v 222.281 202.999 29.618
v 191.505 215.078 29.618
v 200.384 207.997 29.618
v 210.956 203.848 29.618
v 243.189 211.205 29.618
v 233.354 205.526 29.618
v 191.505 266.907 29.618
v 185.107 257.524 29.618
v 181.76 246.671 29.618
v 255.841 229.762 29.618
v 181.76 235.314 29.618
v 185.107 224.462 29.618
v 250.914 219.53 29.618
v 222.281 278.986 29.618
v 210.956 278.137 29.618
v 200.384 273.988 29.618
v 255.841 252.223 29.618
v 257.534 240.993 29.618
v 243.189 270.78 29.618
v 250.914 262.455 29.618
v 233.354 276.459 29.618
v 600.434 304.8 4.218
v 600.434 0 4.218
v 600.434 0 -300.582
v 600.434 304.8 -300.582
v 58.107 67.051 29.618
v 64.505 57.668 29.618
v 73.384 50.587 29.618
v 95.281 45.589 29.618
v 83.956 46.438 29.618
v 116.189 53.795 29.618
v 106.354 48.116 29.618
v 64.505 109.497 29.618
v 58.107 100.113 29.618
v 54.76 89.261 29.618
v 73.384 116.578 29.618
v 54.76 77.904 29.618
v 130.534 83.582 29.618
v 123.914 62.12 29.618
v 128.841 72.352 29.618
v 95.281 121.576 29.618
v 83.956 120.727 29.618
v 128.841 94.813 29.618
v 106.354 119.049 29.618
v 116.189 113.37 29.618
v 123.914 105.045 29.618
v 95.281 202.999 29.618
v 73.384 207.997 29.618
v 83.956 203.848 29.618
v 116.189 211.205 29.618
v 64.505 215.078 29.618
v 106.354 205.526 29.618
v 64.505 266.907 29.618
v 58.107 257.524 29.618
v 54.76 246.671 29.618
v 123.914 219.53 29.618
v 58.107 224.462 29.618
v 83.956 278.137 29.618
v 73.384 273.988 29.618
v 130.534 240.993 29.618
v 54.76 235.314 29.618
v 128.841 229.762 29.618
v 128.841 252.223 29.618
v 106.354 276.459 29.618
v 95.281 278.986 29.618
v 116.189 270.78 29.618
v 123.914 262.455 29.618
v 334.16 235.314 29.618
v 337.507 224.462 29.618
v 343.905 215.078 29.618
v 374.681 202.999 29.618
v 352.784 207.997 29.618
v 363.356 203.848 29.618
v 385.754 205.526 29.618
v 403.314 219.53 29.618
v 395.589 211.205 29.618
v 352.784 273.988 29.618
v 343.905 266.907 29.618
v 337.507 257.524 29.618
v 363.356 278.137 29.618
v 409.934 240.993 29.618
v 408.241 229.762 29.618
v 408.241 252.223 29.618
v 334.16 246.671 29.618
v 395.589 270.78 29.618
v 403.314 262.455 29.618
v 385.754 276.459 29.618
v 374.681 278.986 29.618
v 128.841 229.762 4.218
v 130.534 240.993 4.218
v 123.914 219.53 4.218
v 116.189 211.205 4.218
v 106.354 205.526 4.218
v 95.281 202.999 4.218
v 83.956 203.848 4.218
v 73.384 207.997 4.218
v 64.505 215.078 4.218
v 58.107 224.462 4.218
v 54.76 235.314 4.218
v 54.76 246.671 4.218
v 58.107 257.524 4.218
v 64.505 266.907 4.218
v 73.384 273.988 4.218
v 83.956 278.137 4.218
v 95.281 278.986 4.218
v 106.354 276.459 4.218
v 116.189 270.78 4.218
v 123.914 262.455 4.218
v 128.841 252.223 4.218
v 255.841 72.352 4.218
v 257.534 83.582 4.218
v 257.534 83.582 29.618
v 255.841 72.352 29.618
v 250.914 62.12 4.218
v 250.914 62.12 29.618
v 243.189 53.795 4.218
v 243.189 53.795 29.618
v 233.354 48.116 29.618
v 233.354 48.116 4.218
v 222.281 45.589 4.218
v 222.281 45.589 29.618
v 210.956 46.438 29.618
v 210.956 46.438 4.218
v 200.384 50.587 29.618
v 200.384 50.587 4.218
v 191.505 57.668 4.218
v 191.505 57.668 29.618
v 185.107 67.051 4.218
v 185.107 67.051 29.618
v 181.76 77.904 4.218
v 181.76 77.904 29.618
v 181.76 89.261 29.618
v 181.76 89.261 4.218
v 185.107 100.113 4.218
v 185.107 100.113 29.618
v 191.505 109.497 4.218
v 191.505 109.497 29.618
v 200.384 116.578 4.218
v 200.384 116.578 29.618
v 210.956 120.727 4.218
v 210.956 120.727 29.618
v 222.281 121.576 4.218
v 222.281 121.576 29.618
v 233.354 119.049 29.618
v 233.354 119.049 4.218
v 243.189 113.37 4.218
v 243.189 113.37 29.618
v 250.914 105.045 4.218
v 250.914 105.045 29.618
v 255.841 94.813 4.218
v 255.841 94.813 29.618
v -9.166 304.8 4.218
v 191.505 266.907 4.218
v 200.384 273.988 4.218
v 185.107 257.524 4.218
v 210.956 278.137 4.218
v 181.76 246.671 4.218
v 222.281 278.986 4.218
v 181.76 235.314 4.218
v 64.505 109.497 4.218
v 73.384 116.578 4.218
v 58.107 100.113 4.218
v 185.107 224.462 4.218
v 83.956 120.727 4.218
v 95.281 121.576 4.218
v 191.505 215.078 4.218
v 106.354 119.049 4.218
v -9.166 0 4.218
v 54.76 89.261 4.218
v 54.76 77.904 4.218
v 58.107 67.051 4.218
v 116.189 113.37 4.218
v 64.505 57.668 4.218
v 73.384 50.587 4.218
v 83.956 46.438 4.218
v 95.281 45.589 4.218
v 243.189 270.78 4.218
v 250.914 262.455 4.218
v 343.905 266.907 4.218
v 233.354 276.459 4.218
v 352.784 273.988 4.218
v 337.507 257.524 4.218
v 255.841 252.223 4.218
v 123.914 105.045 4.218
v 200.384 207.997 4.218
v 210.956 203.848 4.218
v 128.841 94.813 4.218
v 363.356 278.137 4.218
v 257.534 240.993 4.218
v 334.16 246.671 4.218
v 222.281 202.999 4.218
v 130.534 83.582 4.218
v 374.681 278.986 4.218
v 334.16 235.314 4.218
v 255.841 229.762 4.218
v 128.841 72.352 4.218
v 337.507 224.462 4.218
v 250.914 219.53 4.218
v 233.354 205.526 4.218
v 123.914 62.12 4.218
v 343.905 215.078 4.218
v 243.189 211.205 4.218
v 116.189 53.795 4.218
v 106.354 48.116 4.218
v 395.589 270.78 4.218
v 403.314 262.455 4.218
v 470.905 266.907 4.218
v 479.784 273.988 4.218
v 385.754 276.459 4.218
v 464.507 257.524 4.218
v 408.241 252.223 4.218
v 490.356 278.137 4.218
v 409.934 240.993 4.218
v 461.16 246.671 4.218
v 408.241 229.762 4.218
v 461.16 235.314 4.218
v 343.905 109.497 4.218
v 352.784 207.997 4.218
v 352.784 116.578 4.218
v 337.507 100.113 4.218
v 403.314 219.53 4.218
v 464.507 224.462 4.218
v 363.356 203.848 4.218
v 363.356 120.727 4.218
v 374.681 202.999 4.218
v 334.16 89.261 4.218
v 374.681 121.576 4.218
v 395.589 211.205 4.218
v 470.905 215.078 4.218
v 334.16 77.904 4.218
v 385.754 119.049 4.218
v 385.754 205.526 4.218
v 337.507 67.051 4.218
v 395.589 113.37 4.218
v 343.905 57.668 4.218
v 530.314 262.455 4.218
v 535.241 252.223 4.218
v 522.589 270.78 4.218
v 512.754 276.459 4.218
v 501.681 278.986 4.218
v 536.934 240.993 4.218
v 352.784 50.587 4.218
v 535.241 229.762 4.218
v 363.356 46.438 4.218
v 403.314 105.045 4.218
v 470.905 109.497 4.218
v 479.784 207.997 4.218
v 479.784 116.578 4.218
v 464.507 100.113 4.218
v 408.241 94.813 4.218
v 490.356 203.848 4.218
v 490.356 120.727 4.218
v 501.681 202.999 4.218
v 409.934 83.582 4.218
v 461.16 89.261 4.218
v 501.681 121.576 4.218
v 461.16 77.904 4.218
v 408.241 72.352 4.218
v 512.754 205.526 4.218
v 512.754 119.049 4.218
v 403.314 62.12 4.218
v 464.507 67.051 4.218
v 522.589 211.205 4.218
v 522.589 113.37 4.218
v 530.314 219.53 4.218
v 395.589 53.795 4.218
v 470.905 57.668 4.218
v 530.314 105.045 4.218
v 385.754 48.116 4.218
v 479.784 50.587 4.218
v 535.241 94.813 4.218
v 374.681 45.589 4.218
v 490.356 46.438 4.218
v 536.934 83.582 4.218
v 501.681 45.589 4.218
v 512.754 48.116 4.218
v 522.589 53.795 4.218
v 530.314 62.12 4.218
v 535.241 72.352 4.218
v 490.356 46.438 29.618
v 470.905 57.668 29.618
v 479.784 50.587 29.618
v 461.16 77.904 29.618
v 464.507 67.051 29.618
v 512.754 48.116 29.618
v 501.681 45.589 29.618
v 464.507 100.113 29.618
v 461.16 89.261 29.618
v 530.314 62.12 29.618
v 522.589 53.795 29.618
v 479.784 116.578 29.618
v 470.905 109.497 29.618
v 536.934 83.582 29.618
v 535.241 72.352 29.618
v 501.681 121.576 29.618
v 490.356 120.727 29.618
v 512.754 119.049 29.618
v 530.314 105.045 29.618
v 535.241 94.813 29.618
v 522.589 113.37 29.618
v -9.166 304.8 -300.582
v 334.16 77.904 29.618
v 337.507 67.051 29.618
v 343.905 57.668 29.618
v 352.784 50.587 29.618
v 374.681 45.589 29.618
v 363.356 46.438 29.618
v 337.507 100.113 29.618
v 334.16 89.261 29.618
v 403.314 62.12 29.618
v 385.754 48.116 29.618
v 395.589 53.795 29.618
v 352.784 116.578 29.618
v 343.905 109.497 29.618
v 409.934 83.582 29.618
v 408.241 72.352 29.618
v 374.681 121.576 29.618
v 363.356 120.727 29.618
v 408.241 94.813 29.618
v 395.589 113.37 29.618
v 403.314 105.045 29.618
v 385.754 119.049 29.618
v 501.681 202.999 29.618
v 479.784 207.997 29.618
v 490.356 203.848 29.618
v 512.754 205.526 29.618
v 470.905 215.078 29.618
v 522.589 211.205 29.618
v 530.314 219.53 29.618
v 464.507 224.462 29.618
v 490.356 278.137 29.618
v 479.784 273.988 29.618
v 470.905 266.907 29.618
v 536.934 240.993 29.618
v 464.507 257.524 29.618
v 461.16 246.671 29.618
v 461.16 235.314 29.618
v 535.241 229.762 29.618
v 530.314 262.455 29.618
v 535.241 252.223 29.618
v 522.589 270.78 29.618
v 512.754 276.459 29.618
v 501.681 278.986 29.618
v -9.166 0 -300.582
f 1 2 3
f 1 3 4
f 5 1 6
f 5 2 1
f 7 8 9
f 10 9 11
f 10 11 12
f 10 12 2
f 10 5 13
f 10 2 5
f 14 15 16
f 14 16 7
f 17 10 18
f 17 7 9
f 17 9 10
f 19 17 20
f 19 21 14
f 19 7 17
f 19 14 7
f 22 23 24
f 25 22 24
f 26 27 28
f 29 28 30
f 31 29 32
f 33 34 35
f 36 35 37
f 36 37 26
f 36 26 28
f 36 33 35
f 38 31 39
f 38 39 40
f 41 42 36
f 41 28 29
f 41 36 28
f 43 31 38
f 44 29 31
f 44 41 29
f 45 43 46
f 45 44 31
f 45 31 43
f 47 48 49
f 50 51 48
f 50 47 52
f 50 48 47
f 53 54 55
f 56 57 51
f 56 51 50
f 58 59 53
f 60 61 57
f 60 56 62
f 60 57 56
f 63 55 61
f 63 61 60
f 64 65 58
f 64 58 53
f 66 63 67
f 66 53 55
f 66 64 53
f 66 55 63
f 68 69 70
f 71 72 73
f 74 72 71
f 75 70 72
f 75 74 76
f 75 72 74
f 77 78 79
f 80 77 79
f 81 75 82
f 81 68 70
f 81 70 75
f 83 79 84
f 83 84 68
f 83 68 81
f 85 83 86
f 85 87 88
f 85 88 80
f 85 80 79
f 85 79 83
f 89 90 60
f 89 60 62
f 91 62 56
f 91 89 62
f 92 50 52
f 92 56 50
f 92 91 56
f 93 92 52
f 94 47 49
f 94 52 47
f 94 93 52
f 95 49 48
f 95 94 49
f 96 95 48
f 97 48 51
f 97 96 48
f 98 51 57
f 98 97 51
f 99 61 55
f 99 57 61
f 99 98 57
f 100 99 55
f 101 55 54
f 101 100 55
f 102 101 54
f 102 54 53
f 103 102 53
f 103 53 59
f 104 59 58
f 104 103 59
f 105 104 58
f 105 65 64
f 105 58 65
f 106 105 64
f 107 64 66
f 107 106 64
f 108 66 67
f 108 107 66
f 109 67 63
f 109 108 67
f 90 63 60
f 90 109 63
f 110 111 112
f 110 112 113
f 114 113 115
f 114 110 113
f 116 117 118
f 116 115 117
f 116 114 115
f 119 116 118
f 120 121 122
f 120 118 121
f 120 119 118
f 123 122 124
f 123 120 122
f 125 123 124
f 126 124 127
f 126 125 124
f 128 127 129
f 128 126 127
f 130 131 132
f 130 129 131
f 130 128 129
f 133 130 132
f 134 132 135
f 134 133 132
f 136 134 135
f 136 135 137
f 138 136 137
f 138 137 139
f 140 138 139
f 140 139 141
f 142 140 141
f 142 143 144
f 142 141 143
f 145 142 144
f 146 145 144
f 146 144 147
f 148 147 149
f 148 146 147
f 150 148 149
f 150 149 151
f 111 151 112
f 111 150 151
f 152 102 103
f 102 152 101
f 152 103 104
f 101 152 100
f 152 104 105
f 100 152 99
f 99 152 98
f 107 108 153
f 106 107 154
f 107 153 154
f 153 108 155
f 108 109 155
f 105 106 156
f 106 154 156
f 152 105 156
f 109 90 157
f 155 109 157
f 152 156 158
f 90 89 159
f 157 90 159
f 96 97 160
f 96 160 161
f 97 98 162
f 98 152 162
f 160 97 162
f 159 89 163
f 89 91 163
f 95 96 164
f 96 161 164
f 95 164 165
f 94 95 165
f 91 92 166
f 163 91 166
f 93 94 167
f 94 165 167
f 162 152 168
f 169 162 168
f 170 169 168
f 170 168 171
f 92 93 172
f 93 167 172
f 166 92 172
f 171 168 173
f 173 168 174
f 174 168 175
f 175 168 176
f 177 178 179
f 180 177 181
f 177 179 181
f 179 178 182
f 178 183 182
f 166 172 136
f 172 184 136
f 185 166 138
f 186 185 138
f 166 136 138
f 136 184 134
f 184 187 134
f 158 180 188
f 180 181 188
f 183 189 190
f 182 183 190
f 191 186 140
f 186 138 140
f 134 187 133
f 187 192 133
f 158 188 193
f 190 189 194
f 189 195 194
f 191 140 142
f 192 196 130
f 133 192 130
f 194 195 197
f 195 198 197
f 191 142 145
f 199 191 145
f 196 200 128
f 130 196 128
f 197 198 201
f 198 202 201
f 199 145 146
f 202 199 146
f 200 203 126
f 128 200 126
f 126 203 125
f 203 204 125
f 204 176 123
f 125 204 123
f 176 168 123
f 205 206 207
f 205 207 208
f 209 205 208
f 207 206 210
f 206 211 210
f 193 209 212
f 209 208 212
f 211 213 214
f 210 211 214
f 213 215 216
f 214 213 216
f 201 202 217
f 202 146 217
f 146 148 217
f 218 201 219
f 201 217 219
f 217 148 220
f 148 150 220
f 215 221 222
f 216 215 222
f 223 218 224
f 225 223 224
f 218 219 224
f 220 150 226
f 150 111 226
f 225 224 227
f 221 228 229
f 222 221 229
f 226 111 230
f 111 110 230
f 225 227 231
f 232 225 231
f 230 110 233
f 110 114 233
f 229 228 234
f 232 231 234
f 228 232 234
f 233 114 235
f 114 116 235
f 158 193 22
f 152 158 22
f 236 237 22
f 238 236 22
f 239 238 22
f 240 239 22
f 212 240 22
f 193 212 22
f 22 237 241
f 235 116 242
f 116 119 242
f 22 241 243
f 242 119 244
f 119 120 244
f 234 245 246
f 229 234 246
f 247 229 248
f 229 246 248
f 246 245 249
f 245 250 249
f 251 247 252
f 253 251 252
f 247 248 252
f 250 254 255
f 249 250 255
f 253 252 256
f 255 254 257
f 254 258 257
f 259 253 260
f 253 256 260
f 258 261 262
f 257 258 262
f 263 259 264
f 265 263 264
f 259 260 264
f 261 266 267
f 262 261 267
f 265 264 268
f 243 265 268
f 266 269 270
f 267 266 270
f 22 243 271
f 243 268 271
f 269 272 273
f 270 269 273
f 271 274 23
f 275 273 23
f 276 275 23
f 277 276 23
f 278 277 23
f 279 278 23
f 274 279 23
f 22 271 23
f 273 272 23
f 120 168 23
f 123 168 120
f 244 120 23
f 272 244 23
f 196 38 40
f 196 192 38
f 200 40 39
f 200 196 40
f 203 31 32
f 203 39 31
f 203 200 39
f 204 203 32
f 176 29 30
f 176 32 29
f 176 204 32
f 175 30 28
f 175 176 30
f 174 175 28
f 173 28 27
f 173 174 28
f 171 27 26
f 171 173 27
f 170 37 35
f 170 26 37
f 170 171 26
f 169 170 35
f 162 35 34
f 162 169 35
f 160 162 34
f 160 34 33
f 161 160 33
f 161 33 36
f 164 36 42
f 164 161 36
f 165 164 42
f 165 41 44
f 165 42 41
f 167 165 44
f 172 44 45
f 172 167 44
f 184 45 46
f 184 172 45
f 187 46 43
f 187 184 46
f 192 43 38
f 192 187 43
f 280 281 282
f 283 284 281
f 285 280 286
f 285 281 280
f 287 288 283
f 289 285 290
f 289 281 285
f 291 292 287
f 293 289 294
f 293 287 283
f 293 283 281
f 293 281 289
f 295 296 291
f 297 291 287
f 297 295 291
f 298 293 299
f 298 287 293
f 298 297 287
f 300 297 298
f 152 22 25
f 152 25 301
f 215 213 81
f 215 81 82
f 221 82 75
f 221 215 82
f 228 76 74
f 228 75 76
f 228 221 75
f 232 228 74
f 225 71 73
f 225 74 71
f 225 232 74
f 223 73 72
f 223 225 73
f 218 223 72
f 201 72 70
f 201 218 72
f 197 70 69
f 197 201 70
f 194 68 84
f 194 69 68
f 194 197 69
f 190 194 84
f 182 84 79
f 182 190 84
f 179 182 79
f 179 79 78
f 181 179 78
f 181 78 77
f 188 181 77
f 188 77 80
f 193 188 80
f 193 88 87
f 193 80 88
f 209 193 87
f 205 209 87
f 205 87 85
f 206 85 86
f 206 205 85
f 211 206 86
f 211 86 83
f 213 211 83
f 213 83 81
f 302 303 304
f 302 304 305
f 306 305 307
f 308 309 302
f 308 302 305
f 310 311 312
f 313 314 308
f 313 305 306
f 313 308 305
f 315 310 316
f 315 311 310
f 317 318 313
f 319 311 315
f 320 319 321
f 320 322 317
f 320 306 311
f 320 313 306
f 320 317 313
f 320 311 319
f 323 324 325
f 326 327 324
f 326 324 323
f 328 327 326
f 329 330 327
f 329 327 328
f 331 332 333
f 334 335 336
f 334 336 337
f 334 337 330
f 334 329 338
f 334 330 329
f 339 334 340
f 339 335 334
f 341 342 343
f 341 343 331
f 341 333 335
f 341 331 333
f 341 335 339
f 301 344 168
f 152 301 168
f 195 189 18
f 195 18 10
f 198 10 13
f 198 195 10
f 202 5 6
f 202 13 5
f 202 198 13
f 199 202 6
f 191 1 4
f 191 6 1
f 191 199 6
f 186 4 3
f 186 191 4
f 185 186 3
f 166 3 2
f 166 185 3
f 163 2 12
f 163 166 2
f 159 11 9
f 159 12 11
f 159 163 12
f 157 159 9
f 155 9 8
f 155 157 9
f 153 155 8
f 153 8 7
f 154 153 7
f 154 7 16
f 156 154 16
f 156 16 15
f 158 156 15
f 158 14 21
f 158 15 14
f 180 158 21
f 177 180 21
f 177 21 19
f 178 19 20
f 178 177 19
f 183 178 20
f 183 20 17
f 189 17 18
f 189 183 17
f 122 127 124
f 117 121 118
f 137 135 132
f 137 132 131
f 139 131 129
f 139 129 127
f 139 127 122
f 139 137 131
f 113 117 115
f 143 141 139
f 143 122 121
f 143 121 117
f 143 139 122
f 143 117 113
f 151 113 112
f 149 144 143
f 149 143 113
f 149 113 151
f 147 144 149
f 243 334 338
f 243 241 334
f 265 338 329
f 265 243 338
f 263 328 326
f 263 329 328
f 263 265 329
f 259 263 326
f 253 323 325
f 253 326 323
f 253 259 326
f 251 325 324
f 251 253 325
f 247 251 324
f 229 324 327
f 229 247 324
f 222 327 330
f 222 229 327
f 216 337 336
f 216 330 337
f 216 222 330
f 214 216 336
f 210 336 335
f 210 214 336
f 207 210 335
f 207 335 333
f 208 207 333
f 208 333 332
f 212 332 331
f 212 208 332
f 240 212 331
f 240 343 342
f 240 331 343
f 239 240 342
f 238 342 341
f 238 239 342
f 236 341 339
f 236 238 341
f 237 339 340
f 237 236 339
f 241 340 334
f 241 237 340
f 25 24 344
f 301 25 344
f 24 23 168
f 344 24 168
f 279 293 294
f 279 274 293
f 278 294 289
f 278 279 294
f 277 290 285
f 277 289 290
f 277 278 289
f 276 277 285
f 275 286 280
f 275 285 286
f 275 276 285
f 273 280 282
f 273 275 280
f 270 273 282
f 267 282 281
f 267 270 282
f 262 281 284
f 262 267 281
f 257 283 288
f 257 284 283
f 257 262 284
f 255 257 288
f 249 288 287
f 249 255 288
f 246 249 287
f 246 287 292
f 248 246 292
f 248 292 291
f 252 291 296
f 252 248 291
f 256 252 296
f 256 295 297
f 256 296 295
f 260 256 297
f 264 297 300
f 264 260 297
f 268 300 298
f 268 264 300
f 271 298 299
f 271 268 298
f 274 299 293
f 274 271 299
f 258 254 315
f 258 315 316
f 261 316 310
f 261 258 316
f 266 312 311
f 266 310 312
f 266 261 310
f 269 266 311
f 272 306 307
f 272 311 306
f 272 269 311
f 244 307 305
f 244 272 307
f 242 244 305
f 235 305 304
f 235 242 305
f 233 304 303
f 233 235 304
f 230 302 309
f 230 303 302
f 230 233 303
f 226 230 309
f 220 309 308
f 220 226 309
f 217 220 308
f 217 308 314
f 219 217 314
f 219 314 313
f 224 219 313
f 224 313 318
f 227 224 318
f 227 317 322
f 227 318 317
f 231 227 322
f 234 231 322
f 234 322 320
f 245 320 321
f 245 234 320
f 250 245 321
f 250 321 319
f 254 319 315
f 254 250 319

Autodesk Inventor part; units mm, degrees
ref_plane "YZ Plane" through (0, 0, 0) normal (1, 0, 0) x (0, 1, 0)
ref_plane "XZ Plane" through (0, 0, 0) normal (0, 1, 0) x (-1, 0, 0)
ref_plane "XY Plane" through (0, 0, 0) normal (0, 0, 1) x (1, 0, 0)
sketch "Sketch1" plane through (0, 0, 0) normal (0, 1, 0) x (-1, 0, 0)
  line L0 (9.1659, 4.2179) -> (-600.4341, 4.2179)
  line L1 (-600.4341, 4.2179) -> (-600.4341, -300.5821)
  line L2 (-600.4341, -300.5821) -> (9.1659, -300.5821)
  line L3 (9.1659, -300.5821) -> (9.1659, 4.2179)
  point P0 (0, 0)
  dimension "d0" = 609.6
  dimension "d1" = 304.8
extrude "Extrusion1" add sketch "Sketch1" along normal blind 304.8
sketch "Sketch2" plane through (-9.1659, 0, 4.2179) normal (0, 0, 1) x (1, 0, 0)
  circle A0 centre (101.6, 83.5824) radius 38.1
  circle A1 centre (228.6, 83.5824) radius 38.1
  circle A2 centre (381, 83.5824) radius 38.1
  circle A3 centre (508, 83.5824) radius 38.1
  circle A4 centre (508, 240.9926) radius 38.1
  circle A5 centre (381, 240.9926) radius 38.1
  circle A6 centre (228.6, 240.9926) radius 38.1
  circle A7 centre (101.6, 240.9926) radius 38.1
  line L0 (609.6, 0) -> (609.6, 304.8) projected
  line L1 (0, 0) -> (0, 304.8) projected
  point P0 (9.1659, 0)
  dimension "d4" = 76.2
  dimension "d5" = 76.2
  dimension "d6" = 76.2
  dimension "d7" = 76.2
  dimension "d8" = 76.2
  dimension "d9" = 76.2
  dimension "d10" = 76.2
  dimension "d11" = 76.2
  dimension "d12" = 101.6
  dimension "d13" = 127
  dimension "d14" = 101.6
  dimension "d15" = 127
extrude "Extrusion2" add sketch "Sketch2" along normal blind 25.4
properties part number "mapButtonStation"
